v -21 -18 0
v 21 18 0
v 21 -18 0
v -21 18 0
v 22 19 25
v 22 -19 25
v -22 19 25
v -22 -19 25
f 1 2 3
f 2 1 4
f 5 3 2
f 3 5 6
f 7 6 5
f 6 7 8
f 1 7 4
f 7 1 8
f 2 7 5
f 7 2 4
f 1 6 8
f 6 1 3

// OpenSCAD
// file: screwTidyInsert.scad
/*
    Creates tapered boxes suitable as inserts into component boxes.
    Having inserts make it easy to take out one type of screw from the container
    while working on a job.
    It is also handy to colour code the compartments. For example, having all the M6
    nuts, bolts and washers using one colour, with M4, and M8 using difference colours.
*/

module taperedSquare( w, h, taper )
{
    polygon( [ [-w/2+taper,0], [-w/2,h], [w/2,h], [w/2-taper,0] ] );
}   

module taperedCube( l, w, d,  taper )
{
    translate( [0,w/2,0] ) rotate([90,0,0]) 
    linear_extrude( w ) {
        taperedSquare( l, d, taper );
    }
}

module doubleTaperedCube( l, w, d, taper )
{
    intersection() {
        taperedCube( l,w,d, taper );
        rotate( [0,0,90] ) taperedCube( w, l, d, taper );
    }

}

module insert( l, w, d, taper = 2, thickness=1.2 )
{
    difference() {
        doubleTaperedCube( l,w,d, taper );
        translate( [0,0,thickness] ) doubleTaperedCube( l-thickness*2, w-thickness*2, d, taper );
    }
}

// insert( 44,38, 25, 1 );
// main file
use <screwTidyInsert.scad>;

// Use this when using "Spiral Outer Contour" setting
doubleTaperedCube( 44,38, 25, 1 );

// Otherwise use this :
//insert( 44,38, 25, 1 );

// 11:45 @ Dad's Tuesday
// 10:30 wednesday
